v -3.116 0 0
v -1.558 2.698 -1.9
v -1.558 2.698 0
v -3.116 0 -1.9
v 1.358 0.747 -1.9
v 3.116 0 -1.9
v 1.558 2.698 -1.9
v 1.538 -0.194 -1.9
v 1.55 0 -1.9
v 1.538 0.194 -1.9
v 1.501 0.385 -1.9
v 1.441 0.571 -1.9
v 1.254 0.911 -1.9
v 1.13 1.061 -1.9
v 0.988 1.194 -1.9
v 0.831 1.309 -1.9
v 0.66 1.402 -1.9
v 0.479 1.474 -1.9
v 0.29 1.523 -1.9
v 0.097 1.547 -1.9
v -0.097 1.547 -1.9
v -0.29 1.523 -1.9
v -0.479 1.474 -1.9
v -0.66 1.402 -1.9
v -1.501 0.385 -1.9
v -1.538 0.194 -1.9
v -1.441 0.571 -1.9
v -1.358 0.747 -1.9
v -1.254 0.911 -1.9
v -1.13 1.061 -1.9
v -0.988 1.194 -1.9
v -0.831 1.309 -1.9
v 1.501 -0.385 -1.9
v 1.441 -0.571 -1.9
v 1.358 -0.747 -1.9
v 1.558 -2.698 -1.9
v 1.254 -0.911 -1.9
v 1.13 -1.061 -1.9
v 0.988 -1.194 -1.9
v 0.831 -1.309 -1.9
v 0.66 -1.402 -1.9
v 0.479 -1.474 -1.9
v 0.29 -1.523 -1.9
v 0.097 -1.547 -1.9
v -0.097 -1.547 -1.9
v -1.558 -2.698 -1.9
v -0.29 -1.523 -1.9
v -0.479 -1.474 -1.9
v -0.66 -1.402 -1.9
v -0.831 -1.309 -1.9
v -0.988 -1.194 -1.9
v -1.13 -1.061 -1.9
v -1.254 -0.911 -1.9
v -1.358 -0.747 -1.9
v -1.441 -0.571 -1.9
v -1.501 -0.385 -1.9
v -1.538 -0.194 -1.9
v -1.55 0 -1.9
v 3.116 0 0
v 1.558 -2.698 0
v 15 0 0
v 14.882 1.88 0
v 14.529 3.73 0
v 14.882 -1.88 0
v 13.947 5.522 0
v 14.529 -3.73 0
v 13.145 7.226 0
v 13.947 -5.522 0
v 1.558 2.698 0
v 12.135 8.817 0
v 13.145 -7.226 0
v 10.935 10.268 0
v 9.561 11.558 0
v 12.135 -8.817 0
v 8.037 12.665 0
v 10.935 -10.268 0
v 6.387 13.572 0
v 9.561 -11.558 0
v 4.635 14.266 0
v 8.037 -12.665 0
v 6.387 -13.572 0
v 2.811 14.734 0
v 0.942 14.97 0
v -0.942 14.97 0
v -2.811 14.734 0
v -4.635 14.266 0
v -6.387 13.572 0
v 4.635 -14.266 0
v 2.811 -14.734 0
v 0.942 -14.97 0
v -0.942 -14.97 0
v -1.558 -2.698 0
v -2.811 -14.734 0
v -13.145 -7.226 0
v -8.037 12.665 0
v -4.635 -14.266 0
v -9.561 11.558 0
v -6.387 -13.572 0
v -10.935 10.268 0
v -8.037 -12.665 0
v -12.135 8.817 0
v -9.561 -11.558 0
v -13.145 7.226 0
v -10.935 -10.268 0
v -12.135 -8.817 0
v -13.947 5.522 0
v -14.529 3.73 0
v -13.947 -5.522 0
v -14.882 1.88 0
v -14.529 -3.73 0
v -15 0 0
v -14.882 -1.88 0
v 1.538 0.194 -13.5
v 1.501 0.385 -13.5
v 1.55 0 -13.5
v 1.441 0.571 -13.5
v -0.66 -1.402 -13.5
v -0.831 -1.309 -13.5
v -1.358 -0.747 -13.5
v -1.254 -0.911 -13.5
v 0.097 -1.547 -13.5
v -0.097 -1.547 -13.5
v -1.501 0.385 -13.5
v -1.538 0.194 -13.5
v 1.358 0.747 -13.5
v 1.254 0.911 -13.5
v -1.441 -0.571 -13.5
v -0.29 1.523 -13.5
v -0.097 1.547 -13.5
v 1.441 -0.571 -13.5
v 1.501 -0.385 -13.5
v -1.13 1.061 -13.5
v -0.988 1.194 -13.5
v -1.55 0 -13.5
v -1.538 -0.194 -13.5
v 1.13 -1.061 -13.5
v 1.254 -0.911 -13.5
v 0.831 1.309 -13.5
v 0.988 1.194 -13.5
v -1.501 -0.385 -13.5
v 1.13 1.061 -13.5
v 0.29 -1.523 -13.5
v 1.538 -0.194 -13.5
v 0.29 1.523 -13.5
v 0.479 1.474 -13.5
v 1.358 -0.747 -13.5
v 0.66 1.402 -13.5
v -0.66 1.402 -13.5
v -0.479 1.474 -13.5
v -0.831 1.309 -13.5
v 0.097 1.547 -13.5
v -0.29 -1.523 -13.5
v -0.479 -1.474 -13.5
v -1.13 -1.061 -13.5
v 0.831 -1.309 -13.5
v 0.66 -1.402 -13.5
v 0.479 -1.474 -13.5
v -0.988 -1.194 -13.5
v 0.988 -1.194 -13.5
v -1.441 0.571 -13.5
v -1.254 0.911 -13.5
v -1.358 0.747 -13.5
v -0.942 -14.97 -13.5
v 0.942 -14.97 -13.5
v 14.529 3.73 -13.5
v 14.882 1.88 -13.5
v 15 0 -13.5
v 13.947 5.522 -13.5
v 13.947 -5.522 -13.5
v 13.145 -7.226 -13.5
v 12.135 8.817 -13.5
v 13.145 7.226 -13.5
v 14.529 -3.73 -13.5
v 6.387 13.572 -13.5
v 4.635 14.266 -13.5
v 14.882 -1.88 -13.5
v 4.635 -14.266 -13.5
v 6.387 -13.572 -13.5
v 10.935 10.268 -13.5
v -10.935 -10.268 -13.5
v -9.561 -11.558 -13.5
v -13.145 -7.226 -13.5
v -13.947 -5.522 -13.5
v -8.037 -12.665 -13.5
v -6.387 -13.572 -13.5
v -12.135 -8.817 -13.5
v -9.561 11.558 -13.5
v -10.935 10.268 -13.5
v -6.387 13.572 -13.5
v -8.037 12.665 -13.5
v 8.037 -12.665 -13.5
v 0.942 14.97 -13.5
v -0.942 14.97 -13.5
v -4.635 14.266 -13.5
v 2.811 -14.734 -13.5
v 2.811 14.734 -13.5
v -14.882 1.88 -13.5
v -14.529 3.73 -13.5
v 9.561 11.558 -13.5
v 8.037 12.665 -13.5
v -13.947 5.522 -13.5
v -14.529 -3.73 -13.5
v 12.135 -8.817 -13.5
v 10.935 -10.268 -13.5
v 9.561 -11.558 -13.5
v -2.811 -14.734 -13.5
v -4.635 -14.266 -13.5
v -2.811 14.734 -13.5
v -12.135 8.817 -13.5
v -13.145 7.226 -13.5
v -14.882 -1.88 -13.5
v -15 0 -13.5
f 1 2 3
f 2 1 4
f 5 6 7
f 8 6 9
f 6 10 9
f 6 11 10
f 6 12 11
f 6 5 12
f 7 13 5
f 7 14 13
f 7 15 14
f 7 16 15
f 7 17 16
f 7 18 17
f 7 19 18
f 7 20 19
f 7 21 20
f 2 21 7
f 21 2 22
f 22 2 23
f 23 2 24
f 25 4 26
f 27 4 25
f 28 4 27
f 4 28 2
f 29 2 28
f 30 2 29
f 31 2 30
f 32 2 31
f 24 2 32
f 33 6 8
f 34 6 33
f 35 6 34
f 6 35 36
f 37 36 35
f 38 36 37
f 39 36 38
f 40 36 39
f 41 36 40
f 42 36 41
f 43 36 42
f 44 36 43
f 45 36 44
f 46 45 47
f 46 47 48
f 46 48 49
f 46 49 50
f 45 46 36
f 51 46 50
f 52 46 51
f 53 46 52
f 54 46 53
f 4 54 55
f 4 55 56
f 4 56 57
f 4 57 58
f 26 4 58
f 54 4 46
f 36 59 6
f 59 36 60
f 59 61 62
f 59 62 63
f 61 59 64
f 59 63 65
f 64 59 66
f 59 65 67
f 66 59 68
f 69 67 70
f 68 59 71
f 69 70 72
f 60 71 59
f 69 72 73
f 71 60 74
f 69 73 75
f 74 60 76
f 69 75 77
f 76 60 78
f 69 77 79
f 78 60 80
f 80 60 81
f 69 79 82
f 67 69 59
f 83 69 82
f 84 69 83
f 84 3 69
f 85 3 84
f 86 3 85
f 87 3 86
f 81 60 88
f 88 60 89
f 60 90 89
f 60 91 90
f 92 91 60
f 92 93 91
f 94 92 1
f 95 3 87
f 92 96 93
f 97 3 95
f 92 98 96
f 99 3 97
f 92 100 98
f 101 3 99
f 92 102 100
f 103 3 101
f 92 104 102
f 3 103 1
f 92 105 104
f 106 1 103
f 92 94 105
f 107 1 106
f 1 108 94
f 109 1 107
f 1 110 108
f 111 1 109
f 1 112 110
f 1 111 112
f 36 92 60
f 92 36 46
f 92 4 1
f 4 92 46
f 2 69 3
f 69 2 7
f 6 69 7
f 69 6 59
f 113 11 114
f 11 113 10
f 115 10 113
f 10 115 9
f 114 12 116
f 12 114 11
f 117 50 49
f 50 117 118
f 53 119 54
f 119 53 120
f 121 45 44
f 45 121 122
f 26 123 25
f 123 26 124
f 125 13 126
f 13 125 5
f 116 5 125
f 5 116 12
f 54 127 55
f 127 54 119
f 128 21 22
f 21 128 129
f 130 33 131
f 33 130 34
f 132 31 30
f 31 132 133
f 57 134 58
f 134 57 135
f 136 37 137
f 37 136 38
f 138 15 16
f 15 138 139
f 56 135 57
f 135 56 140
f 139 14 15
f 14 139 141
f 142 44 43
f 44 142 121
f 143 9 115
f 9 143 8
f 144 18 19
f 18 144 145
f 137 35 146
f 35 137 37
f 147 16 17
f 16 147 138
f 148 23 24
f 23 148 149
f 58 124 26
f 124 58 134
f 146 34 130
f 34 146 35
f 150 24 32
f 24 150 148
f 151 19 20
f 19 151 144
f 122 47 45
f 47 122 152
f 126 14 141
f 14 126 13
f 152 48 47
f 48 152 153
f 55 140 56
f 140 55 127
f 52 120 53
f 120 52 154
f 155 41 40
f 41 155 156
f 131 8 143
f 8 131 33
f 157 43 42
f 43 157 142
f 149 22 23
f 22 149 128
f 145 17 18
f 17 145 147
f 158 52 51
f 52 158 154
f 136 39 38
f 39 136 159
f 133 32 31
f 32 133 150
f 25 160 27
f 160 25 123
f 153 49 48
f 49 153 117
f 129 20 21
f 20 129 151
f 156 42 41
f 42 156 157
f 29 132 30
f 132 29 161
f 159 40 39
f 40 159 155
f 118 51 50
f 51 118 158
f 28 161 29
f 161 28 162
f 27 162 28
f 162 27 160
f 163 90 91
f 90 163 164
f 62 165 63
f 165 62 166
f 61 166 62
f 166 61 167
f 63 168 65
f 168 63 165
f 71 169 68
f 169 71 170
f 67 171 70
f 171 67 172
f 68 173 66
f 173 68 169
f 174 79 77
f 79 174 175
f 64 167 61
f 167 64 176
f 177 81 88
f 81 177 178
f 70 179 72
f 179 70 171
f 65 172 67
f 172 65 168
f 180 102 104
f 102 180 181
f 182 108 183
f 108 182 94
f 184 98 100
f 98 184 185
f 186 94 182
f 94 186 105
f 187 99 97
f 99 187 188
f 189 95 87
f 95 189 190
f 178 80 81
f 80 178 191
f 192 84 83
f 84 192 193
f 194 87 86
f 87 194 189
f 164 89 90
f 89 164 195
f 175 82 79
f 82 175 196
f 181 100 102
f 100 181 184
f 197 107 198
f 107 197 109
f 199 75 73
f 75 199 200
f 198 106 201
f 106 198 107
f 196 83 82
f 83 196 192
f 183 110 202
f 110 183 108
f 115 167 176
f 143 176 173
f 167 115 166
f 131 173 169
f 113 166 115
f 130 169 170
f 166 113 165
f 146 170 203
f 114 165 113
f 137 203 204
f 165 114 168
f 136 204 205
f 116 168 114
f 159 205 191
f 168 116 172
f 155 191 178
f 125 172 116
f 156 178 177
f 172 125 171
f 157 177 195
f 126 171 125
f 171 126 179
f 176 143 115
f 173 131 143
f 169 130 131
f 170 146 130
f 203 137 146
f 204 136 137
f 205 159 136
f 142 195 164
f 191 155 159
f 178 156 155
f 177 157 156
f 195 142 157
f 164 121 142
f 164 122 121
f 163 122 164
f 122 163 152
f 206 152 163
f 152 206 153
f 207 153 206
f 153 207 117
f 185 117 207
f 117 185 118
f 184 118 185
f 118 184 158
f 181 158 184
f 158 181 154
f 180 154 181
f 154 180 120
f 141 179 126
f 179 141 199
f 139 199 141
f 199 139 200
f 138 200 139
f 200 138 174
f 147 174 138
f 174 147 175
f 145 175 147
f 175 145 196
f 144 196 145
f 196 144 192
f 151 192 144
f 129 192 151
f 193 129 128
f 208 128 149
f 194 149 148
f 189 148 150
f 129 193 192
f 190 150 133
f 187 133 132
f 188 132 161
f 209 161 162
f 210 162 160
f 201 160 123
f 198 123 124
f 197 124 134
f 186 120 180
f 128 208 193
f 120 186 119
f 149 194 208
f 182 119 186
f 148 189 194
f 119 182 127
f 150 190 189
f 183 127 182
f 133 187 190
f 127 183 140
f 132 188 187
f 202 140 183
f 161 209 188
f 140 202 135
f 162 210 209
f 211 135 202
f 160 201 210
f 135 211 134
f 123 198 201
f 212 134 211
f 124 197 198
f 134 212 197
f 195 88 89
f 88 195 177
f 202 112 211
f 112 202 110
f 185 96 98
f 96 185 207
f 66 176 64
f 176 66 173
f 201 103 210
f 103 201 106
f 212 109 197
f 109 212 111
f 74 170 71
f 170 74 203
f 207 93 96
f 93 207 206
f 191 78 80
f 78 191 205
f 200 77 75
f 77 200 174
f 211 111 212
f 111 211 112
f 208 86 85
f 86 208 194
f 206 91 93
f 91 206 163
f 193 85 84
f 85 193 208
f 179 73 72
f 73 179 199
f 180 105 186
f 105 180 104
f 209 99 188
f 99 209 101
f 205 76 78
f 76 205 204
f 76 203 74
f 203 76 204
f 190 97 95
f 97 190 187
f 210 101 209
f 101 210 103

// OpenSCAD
$fn = 50;

difference() {
	union() {
		translate(v = [0, 0, -13.5]) {
			cylinder(h = 13.5, r = 15.0);
		}
	}
	union() {
		translate(v = [0, 0, 0]) {
			rotate(a = [0, 0, 0]) {
				difference() {
					union() {
						translate(v = [0, 0, -1.9]) {
							linear_extrude(height = 1.9) {
								polygon(points = [[3.1158, 0.0], [1.5579000000000005, 2.698361953111554], [-1.5578999999999994, 2.6983619531115544], [-3.1158, 3.815754496783323e-16], [-1.5579000000000014, -2.6983619531115535], [1.557899999999998, -2.6983619531115552]]);
							}
						}
					}
					union();
				}
			}
		}
		#translate(v = [0, 0, -100.0]) {
			cylinder(h = 200, r = 1.55);
		}
	}
}
